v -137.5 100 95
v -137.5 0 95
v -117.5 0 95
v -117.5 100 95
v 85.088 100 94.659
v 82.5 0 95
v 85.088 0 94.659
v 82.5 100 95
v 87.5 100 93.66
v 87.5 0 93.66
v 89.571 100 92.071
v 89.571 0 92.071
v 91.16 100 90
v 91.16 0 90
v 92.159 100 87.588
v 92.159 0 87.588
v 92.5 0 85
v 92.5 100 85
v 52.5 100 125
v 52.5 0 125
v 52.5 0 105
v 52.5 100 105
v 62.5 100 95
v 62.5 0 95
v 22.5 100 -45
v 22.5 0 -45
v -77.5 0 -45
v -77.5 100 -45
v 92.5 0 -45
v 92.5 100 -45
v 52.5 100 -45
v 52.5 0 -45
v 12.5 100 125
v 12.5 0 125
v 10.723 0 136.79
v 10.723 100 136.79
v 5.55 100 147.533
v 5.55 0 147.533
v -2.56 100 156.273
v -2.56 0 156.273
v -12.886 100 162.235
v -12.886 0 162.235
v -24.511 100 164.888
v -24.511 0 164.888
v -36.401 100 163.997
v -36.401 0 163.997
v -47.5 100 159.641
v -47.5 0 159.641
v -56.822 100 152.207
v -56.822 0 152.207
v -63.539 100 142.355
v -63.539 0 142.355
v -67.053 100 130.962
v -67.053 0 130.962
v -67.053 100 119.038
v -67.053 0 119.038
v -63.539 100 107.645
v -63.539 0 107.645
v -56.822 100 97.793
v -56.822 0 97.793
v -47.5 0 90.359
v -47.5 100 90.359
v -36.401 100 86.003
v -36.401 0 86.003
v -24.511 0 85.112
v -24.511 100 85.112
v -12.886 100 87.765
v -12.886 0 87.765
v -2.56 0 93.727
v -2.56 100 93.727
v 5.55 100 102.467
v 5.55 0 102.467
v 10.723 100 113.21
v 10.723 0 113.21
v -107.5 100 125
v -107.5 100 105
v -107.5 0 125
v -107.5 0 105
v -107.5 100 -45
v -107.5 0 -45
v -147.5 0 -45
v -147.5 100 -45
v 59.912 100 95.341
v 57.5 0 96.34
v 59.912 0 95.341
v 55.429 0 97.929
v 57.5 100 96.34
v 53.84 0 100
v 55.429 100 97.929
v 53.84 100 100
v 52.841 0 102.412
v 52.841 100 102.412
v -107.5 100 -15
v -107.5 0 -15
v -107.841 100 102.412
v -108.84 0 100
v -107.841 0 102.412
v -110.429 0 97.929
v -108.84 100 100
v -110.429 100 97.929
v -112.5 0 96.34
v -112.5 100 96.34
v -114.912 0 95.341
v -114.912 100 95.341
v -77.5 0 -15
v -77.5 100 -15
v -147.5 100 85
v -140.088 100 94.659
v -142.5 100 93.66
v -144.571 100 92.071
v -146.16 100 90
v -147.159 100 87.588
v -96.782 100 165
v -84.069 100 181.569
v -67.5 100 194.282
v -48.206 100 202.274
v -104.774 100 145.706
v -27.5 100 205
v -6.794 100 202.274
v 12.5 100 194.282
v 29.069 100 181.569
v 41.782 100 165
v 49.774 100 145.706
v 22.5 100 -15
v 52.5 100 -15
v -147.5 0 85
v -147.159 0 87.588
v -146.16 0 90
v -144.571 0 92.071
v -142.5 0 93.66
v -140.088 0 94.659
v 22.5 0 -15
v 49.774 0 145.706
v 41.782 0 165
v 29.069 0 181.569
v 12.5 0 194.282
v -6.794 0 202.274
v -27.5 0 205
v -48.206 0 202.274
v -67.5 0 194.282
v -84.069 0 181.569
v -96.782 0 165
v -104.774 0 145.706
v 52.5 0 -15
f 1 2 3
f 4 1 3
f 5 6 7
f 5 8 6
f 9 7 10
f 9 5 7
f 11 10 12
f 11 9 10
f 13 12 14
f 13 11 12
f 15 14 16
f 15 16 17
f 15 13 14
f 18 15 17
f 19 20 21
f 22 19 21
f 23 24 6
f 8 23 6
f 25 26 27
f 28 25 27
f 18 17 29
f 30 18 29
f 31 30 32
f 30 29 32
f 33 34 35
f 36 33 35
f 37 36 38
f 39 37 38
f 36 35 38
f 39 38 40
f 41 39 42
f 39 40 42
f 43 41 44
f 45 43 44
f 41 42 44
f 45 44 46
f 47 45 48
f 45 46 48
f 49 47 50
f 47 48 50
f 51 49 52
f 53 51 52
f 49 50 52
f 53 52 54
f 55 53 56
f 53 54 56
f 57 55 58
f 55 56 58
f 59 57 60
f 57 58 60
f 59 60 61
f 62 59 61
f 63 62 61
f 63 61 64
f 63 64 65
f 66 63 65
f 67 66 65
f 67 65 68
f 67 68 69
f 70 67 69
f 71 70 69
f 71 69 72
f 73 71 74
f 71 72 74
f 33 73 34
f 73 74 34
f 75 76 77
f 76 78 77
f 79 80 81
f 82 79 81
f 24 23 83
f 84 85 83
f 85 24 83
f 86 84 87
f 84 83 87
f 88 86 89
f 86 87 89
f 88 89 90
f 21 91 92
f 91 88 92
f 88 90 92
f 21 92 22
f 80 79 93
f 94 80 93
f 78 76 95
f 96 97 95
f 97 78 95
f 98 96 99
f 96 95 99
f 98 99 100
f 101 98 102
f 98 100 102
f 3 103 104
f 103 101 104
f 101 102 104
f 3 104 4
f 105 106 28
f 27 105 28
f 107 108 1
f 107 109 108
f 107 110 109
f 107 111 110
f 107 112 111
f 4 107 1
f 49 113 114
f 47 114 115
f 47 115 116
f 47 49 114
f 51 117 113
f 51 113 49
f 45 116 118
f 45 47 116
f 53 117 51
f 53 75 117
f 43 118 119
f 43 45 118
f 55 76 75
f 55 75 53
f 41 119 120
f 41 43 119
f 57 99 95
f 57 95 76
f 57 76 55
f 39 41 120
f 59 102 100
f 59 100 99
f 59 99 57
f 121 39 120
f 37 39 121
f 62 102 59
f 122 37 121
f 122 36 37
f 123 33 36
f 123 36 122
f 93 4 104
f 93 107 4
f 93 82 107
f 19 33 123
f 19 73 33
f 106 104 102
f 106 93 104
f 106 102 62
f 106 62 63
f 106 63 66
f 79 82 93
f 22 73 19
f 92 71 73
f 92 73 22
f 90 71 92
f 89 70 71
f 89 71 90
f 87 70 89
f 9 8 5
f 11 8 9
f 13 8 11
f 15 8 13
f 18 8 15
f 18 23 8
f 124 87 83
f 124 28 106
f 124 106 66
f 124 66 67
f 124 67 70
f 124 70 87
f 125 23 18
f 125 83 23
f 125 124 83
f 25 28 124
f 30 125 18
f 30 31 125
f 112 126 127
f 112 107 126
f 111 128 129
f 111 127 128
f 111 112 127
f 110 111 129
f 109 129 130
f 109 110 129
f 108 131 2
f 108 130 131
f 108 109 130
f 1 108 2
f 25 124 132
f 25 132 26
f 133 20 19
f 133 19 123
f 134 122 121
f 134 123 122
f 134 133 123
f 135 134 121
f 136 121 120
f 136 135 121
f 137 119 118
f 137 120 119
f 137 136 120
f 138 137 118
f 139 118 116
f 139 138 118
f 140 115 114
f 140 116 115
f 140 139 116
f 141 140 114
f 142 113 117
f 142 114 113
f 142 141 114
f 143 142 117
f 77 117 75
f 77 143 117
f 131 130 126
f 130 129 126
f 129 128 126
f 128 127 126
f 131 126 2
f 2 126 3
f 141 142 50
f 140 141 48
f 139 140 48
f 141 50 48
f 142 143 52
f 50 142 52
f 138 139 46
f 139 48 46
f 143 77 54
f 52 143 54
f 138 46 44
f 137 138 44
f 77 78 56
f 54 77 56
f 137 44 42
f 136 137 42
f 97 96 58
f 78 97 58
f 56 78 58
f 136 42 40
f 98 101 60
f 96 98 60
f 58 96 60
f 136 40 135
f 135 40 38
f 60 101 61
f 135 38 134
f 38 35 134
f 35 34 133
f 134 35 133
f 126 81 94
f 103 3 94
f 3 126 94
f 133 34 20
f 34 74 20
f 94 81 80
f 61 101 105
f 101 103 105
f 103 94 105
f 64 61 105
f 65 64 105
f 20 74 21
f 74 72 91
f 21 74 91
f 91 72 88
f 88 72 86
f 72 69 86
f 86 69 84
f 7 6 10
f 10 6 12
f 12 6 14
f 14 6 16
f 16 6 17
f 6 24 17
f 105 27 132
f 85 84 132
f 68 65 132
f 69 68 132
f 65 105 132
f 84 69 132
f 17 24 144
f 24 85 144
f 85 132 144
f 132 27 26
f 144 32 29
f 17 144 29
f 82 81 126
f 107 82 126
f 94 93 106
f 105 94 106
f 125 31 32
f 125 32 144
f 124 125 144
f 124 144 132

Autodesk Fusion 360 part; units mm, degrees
sketch "Sketch1" plane through (0, 0, 0) normal (0, 1, 0) x (1, 0, 0)
  line L0 (-147.5, 45) -> (-147.5, -95)
  line L1 (92.5, -95) -> (92.5, 45)
  line L2 (52.5, 45) -> (52.5, 15)
  line L3 (22.5, 15) -> (22.5, 45)
  line L4 (52.5, 15) -> (22.5, 15)
  line L5 (-107.5, 45) -> (-107.5, 15)
  line L6 (-107.5, 15) -> (-77.5, 15)
  line L7 (-77.5, 15) -> (-77.5, 45)
  line L8 (-107.5, 45) -> (-147.5, 45)
  line L9 (92.5, 45) -> (52.5, 45)
  line L10 (22.5, 45) -> (-77.5, 45)
  line L11 (-107.5, -95) -> (-107.5, -125)
  line L12 (52.5, -125) -> (52.5, -95)
  line L13 (-147.5, -95) -> (-107.5, -95)
  line L14 (52.5, -95) -> (92.5, -95)
  arc A0 (-107.5, -125) -> (52.5, -125) centre (-27.5, -125) ccw
  dimension "d1" = 40
  dimension "d2" = 30
  dimension "d3" = 40
  dimension "d4" = 30
  dimension "d5" = 100
  dimension "d6" = 30
  dimension "d7" = 30
  dimension "d8" = 120
  dimension "d9" = 140
  dimension "d10" = 40
  dimension "d11" = 170
extrude "Extrude1" add sketch "Sketch1" along normal blind 100
sketch "Sketch2" plane through (0, 0, 0) normal (0, -1, 0) x (1, 0, 0)
  line L0 (-147.5, -45) -> (-107.5, -45)
  line L1 (-107.5, -45) -> (-107.5, -15)
  line L2 (-107.5, -15) -> (-77.5, -15)
  line L3 (-77.5, -15) -> (-77.5, -45)
  line L4 (-77.5, -45) -> (22.5, -45)
  line L5 (22.5, -45) -> (22.5, -15)
  line L6 (22.5, -15) -> (52.5, -15)
  line L7 (52.5, -15) -> (52.5, -45)
  line L8 (52.5, -45) -> (92.5, -45)
  line L9 (92.5, -45) -> (92.5, 95)
  line L10 (92.5, 95) -> (52.5, 95)
  line L11 (52.5, 95) -> (52.5, 125)
  arc A0 (52.5, 125) -> (-107.5, 125) centre (-27.5, 125) ccw
  line L12 (-107.5, 125) -> (-107.5, 95)
  line L13 (-107.5, 95) -> (-147.5, 95)
  line L14 (-147.5, 95) -> (-147.5, -45)
  circle A1 centre (-27.5, 125) radius 40
  dimension "d14" = 80
extrude "Extrude2" cut sketch "Sketch2" against normal blind 100 contours A1
fillet "Fillet1" radius 10 2 edges at (52.5, 50, 95) (-107.5, 50, 95)
fillet "Fillet2" radius 10 2 edges at (92.5, 50, 95) (-147.5, 50, 95)
